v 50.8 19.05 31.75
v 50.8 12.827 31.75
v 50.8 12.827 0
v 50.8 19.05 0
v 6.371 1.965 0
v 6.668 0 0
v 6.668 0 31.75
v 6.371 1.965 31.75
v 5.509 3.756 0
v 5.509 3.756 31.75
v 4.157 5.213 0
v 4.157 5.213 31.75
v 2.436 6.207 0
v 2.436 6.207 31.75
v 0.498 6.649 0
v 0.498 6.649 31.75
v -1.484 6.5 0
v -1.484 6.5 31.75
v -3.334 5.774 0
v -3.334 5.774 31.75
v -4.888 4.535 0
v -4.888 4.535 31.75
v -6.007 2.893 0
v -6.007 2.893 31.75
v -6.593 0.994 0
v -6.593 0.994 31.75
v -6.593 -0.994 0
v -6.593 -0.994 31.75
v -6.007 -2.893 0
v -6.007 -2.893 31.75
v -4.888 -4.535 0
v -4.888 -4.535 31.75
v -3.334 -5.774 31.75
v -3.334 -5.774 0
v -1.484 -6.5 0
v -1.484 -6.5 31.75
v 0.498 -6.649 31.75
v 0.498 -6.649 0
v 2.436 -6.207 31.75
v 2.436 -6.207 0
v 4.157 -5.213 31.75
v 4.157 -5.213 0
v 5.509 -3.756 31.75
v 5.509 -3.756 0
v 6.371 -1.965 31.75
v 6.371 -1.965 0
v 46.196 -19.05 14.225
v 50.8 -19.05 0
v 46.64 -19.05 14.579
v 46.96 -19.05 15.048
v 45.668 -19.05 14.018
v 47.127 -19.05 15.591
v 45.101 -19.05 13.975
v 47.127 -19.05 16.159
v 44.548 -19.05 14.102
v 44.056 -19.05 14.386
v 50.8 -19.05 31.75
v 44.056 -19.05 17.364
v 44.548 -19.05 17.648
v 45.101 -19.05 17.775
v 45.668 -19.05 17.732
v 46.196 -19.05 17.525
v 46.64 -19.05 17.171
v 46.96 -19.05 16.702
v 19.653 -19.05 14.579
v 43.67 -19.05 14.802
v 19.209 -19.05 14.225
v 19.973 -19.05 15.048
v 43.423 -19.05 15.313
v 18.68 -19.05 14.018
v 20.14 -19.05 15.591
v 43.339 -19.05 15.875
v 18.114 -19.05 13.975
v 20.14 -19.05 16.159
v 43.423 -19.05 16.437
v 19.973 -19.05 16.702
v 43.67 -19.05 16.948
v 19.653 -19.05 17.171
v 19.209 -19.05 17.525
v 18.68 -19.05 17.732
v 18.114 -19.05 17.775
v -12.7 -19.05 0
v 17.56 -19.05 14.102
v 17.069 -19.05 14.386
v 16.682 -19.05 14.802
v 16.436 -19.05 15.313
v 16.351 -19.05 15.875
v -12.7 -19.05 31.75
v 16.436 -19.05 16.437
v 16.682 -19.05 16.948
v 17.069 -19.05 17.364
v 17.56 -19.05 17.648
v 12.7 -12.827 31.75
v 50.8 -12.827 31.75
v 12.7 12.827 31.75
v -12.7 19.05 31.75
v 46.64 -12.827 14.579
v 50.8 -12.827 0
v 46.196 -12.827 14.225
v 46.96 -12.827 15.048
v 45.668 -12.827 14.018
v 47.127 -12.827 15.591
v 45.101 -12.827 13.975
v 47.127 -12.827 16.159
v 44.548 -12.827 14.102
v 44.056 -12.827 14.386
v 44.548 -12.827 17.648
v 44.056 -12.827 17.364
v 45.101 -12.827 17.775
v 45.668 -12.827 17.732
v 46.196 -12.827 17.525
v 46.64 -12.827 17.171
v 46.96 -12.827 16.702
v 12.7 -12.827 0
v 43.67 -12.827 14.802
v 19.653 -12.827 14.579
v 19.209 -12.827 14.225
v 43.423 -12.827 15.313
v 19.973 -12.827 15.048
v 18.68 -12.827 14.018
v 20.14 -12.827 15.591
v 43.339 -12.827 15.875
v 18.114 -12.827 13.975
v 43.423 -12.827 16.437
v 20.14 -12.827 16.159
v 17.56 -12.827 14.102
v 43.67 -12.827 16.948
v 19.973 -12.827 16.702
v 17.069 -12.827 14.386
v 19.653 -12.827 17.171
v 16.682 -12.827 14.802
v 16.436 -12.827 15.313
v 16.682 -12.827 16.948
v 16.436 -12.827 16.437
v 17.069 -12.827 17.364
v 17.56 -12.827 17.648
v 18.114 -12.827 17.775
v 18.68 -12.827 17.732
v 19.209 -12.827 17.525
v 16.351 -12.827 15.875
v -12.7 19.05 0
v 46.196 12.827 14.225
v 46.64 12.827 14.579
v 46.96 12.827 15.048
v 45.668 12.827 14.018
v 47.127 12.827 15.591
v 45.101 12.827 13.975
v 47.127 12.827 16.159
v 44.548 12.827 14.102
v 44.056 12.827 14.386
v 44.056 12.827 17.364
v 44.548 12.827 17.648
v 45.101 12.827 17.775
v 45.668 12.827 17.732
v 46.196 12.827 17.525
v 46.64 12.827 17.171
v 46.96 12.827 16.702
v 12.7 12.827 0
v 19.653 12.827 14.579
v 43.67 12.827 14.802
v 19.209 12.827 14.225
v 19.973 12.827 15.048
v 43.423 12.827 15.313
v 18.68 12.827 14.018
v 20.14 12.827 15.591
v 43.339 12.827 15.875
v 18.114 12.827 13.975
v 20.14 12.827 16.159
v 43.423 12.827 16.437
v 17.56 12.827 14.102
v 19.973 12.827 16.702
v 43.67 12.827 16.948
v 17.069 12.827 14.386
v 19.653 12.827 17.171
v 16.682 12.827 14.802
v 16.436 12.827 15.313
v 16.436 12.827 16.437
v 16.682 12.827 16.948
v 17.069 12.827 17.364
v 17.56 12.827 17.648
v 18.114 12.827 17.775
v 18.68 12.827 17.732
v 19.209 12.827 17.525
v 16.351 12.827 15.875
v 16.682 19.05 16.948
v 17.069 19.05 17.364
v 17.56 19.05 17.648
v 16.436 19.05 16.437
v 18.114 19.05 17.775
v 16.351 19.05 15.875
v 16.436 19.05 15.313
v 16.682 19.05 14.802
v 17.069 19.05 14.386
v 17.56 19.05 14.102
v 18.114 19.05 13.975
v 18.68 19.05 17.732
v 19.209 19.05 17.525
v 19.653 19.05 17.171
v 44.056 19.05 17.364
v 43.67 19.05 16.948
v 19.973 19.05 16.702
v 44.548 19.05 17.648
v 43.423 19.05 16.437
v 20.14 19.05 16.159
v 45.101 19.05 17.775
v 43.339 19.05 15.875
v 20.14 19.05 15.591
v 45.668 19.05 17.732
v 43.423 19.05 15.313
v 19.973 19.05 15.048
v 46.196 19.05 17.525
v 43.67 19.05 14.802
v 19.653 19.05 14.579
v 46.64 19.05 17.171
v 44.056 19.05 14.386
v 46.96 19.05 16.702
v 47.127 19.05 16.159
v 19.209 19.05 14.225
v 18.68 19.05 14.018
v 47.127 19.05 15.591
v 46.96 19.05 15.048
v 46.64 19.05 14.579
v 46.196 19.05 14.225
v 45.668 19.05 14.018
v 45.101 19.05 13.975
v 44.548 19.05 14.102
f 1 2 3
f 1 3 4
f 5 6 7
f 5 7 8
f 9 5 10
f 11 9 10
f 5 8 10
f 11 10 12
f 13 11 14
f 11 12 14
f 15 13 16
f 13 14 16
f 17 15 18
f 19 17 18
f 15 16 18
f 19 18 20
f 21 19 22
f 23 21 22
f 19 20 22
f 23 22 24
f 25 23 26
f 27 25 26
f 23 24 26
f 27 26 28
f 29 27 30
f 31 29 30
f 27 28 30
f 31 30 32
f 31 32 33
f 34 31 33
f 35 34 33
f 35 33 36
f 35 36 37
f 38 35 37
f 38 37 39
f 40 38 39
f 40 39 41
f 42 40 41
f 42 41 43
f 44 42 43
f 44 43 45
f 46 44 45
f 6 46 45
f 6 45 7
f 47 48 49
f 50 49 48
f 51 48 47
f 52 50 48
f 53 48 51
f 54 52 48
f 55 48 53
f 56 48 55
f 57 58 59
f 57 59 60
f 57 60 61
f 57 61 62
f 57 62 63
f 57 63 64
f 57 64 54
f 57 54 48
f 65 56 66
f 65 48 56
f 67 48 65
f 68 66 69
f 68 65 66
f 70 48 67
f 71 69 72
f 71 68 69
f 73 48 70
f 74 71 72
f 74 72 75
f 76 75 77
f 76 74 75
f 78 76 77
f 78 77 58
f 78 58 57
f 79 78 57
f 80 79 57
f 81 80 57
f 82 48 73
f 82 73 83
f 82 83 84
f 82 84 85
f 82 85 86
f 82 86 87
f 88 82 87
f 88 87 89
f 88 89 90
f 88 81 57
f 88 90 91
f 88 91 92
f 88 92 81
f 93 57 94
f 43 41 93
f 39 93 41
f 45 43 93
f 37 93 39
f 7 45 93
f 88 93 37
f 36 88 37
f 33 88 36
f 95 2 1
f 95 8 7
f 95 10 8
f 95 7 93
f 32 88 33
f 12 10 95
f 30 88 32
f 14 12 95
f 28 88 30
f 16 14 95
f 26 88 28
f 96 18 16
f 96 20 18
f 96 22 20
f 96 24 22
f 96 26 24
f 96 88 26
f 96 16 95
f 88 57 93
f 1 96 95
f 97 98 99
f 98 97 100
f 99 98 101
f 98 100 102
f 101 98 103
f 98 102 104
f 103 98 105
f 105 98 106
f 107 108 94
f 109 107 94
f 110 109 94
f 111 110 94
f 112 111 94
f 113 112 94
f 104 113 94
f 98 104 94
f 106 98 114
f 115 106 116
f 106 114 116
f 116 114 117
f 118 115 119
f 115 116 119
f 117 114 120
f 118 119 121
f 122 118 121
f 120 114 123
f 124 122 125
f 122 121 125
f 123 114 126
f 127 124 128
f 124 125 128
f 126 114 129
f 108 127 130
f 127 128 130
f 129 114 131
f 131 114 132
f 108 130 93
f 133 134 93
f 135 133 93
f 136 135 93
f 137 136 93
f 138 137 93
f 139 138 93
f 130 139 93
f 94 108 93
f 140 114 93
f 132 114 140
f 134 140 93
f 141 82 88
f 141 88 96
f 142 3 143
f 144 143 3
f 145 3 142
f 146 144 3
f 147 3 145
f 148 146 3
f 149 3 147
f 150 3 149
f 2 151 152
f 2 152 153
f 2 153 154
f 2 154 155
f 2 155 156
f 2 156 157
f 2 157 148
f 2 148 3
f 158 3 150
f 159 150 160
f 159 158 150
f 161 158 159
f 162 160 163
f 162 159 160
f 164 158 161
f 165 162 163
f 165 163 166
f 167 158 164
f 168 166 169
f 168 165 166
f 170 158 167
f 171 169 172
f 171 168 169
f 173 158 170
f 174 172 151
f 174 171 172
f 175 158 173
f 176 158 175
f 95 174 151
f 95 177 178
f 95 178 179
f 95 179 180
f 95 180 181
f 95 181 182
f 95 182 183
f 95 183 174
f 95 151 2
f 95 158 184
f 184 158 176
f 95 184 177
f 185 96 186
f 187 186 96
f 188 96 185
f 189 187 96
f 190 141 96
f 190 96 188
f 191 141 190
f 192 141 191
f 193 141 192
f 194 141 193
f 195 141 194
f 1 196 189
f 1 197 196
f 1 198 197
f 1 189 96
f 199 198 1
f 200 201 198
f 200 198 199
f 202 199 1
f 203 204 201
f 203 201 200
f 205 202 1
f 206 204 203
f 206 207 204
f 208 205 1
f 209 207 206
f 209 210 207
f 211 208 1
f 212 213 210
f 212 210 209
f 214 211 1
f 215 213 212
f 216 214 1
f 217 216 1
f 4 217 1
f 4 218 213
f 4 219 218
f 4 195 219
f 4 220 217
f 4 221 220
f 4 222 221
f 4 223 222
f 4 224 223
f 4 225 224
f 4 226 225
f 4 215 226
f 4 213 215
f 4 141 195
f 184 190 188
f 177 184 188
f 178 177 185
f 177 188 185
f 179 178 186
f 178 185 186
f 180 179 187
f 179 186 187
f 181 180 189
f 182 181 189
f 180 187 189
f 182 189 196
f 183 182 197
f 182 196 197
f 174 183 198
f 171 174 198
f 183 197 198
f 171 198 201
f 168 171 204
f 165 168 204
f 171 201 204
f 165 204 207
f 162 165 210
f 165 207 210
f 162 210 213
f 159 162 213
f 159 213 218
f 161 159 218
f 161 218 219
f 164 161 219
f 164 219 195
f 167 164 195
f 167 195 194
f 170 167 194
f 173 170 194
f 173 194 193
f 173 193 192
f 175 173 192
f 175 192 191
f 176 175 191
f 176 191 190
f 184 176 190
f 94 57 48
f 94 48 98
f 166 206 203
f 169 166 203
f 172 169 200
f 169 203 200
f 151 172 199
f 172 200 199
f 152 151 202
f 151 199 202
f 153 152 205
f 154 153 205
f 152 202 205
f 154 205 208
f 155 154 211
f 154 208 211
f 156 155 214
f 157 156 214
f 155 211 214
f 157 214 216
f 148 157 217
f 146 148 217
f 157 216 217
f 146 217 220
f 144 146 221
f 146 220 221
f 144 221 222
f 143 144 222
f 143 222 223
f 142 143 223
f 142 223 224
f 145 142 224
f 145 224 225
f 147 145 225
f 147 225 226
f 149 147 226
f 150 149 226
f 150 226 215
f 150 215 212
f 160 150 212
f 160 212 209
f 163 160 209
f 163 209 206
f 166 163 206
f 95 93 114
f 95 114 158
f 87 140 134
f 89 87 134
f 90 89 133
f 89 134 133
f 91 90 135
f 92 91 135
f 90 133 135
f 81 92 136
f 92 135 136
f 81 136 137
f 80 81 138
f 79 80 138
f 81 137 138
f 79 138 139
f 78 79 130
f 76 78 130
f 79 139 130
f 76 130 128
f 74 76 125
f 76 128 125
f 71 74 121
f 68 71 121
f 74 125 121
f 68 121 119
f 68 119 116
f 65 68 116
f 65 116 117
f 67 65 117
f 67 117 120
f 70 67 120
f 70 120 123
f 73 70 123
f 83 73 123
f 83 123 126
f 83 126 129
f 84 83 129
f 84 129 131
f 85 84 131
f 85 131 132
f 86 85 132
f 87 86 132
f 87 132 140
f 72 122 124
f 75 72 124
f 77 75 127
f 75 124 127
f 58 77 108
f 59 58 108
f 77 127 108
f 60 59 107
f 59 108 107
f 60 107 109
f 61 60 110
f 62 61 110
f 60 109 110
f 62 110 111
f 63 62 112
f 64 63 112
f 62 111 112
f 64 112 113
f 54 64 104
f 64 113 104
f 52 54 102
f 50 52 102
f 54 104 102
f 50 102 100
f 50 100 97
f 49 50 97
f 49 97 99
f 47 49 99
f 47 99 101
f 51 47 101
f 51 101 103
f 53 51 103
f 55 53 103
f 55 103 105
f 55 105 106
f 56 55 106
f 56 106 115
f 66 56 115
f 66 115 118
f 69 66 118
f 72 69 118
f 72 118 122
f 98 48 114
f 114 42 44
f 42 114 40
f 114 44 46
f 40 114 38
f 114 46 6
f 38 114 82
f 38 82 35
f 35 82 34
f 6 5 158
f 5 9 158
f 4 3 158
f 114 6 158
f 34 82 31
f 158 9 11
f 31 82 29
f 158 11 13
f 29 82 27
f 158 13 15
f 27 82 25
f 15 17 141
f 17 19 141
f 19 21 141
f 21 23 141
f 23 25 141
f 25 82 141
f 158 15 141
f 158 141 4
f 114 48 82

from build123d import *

# Parameters (mm, degrees)
F0_W     = 25.4
F0_H     = 38.1
F1_DEPTH = 31.75
F2_W     = 6.223
F2_H     = 31.75
F3_DEPTH = 38.1
F4_R     = 6.6675
F5_DEPTH = 31.751
F6_R     = 1.905
F7_DEPTH = 38.101


with BuildPart() as f1:
    # F0 (on Top) → F1 (new body)
    with BuildSketch(Plane.XY):
        Rectangle(F0_W, F0_H)
    extrude(amount=F1_DEPTH)

    # F2 (on face) → F3 (join)
    with BuildSketch(Plane.YZ.offset(12.7)):
        with Locations((-15.9385, 15.875)):
            Rectangle(F2_W, F2_H)
        with Locations((15.9385, 15.875)):
            Rectangle(F2_W, F2_H)
    extrude(amount=F3_DEPTH)

    # F4 (on face) → F5 (cut, through all)
    with BuildSketch(Plane.XY.offset(31.75)):
        Circle(F4_R)
    extrude(amount=-F5_DEPTH, mode=Mode.SUBTRACT)

    # F6 (on face) → F7 (cut, through all)
    with BuildSketch(Plane(origin=(0, 19.05, 0), x_dir=(-1, 0, 0), z_dir=(0, 1, 0))):
        with Locations((-45.24375, 15.875)):
            Circle(F6_R)
        with Locations((-18.25625, 15.875)):
            Circle(F6_R)
    extrude(amount=-F7_DEPTH, mode=Mode.SUBTRACT)


solid = f1.part
